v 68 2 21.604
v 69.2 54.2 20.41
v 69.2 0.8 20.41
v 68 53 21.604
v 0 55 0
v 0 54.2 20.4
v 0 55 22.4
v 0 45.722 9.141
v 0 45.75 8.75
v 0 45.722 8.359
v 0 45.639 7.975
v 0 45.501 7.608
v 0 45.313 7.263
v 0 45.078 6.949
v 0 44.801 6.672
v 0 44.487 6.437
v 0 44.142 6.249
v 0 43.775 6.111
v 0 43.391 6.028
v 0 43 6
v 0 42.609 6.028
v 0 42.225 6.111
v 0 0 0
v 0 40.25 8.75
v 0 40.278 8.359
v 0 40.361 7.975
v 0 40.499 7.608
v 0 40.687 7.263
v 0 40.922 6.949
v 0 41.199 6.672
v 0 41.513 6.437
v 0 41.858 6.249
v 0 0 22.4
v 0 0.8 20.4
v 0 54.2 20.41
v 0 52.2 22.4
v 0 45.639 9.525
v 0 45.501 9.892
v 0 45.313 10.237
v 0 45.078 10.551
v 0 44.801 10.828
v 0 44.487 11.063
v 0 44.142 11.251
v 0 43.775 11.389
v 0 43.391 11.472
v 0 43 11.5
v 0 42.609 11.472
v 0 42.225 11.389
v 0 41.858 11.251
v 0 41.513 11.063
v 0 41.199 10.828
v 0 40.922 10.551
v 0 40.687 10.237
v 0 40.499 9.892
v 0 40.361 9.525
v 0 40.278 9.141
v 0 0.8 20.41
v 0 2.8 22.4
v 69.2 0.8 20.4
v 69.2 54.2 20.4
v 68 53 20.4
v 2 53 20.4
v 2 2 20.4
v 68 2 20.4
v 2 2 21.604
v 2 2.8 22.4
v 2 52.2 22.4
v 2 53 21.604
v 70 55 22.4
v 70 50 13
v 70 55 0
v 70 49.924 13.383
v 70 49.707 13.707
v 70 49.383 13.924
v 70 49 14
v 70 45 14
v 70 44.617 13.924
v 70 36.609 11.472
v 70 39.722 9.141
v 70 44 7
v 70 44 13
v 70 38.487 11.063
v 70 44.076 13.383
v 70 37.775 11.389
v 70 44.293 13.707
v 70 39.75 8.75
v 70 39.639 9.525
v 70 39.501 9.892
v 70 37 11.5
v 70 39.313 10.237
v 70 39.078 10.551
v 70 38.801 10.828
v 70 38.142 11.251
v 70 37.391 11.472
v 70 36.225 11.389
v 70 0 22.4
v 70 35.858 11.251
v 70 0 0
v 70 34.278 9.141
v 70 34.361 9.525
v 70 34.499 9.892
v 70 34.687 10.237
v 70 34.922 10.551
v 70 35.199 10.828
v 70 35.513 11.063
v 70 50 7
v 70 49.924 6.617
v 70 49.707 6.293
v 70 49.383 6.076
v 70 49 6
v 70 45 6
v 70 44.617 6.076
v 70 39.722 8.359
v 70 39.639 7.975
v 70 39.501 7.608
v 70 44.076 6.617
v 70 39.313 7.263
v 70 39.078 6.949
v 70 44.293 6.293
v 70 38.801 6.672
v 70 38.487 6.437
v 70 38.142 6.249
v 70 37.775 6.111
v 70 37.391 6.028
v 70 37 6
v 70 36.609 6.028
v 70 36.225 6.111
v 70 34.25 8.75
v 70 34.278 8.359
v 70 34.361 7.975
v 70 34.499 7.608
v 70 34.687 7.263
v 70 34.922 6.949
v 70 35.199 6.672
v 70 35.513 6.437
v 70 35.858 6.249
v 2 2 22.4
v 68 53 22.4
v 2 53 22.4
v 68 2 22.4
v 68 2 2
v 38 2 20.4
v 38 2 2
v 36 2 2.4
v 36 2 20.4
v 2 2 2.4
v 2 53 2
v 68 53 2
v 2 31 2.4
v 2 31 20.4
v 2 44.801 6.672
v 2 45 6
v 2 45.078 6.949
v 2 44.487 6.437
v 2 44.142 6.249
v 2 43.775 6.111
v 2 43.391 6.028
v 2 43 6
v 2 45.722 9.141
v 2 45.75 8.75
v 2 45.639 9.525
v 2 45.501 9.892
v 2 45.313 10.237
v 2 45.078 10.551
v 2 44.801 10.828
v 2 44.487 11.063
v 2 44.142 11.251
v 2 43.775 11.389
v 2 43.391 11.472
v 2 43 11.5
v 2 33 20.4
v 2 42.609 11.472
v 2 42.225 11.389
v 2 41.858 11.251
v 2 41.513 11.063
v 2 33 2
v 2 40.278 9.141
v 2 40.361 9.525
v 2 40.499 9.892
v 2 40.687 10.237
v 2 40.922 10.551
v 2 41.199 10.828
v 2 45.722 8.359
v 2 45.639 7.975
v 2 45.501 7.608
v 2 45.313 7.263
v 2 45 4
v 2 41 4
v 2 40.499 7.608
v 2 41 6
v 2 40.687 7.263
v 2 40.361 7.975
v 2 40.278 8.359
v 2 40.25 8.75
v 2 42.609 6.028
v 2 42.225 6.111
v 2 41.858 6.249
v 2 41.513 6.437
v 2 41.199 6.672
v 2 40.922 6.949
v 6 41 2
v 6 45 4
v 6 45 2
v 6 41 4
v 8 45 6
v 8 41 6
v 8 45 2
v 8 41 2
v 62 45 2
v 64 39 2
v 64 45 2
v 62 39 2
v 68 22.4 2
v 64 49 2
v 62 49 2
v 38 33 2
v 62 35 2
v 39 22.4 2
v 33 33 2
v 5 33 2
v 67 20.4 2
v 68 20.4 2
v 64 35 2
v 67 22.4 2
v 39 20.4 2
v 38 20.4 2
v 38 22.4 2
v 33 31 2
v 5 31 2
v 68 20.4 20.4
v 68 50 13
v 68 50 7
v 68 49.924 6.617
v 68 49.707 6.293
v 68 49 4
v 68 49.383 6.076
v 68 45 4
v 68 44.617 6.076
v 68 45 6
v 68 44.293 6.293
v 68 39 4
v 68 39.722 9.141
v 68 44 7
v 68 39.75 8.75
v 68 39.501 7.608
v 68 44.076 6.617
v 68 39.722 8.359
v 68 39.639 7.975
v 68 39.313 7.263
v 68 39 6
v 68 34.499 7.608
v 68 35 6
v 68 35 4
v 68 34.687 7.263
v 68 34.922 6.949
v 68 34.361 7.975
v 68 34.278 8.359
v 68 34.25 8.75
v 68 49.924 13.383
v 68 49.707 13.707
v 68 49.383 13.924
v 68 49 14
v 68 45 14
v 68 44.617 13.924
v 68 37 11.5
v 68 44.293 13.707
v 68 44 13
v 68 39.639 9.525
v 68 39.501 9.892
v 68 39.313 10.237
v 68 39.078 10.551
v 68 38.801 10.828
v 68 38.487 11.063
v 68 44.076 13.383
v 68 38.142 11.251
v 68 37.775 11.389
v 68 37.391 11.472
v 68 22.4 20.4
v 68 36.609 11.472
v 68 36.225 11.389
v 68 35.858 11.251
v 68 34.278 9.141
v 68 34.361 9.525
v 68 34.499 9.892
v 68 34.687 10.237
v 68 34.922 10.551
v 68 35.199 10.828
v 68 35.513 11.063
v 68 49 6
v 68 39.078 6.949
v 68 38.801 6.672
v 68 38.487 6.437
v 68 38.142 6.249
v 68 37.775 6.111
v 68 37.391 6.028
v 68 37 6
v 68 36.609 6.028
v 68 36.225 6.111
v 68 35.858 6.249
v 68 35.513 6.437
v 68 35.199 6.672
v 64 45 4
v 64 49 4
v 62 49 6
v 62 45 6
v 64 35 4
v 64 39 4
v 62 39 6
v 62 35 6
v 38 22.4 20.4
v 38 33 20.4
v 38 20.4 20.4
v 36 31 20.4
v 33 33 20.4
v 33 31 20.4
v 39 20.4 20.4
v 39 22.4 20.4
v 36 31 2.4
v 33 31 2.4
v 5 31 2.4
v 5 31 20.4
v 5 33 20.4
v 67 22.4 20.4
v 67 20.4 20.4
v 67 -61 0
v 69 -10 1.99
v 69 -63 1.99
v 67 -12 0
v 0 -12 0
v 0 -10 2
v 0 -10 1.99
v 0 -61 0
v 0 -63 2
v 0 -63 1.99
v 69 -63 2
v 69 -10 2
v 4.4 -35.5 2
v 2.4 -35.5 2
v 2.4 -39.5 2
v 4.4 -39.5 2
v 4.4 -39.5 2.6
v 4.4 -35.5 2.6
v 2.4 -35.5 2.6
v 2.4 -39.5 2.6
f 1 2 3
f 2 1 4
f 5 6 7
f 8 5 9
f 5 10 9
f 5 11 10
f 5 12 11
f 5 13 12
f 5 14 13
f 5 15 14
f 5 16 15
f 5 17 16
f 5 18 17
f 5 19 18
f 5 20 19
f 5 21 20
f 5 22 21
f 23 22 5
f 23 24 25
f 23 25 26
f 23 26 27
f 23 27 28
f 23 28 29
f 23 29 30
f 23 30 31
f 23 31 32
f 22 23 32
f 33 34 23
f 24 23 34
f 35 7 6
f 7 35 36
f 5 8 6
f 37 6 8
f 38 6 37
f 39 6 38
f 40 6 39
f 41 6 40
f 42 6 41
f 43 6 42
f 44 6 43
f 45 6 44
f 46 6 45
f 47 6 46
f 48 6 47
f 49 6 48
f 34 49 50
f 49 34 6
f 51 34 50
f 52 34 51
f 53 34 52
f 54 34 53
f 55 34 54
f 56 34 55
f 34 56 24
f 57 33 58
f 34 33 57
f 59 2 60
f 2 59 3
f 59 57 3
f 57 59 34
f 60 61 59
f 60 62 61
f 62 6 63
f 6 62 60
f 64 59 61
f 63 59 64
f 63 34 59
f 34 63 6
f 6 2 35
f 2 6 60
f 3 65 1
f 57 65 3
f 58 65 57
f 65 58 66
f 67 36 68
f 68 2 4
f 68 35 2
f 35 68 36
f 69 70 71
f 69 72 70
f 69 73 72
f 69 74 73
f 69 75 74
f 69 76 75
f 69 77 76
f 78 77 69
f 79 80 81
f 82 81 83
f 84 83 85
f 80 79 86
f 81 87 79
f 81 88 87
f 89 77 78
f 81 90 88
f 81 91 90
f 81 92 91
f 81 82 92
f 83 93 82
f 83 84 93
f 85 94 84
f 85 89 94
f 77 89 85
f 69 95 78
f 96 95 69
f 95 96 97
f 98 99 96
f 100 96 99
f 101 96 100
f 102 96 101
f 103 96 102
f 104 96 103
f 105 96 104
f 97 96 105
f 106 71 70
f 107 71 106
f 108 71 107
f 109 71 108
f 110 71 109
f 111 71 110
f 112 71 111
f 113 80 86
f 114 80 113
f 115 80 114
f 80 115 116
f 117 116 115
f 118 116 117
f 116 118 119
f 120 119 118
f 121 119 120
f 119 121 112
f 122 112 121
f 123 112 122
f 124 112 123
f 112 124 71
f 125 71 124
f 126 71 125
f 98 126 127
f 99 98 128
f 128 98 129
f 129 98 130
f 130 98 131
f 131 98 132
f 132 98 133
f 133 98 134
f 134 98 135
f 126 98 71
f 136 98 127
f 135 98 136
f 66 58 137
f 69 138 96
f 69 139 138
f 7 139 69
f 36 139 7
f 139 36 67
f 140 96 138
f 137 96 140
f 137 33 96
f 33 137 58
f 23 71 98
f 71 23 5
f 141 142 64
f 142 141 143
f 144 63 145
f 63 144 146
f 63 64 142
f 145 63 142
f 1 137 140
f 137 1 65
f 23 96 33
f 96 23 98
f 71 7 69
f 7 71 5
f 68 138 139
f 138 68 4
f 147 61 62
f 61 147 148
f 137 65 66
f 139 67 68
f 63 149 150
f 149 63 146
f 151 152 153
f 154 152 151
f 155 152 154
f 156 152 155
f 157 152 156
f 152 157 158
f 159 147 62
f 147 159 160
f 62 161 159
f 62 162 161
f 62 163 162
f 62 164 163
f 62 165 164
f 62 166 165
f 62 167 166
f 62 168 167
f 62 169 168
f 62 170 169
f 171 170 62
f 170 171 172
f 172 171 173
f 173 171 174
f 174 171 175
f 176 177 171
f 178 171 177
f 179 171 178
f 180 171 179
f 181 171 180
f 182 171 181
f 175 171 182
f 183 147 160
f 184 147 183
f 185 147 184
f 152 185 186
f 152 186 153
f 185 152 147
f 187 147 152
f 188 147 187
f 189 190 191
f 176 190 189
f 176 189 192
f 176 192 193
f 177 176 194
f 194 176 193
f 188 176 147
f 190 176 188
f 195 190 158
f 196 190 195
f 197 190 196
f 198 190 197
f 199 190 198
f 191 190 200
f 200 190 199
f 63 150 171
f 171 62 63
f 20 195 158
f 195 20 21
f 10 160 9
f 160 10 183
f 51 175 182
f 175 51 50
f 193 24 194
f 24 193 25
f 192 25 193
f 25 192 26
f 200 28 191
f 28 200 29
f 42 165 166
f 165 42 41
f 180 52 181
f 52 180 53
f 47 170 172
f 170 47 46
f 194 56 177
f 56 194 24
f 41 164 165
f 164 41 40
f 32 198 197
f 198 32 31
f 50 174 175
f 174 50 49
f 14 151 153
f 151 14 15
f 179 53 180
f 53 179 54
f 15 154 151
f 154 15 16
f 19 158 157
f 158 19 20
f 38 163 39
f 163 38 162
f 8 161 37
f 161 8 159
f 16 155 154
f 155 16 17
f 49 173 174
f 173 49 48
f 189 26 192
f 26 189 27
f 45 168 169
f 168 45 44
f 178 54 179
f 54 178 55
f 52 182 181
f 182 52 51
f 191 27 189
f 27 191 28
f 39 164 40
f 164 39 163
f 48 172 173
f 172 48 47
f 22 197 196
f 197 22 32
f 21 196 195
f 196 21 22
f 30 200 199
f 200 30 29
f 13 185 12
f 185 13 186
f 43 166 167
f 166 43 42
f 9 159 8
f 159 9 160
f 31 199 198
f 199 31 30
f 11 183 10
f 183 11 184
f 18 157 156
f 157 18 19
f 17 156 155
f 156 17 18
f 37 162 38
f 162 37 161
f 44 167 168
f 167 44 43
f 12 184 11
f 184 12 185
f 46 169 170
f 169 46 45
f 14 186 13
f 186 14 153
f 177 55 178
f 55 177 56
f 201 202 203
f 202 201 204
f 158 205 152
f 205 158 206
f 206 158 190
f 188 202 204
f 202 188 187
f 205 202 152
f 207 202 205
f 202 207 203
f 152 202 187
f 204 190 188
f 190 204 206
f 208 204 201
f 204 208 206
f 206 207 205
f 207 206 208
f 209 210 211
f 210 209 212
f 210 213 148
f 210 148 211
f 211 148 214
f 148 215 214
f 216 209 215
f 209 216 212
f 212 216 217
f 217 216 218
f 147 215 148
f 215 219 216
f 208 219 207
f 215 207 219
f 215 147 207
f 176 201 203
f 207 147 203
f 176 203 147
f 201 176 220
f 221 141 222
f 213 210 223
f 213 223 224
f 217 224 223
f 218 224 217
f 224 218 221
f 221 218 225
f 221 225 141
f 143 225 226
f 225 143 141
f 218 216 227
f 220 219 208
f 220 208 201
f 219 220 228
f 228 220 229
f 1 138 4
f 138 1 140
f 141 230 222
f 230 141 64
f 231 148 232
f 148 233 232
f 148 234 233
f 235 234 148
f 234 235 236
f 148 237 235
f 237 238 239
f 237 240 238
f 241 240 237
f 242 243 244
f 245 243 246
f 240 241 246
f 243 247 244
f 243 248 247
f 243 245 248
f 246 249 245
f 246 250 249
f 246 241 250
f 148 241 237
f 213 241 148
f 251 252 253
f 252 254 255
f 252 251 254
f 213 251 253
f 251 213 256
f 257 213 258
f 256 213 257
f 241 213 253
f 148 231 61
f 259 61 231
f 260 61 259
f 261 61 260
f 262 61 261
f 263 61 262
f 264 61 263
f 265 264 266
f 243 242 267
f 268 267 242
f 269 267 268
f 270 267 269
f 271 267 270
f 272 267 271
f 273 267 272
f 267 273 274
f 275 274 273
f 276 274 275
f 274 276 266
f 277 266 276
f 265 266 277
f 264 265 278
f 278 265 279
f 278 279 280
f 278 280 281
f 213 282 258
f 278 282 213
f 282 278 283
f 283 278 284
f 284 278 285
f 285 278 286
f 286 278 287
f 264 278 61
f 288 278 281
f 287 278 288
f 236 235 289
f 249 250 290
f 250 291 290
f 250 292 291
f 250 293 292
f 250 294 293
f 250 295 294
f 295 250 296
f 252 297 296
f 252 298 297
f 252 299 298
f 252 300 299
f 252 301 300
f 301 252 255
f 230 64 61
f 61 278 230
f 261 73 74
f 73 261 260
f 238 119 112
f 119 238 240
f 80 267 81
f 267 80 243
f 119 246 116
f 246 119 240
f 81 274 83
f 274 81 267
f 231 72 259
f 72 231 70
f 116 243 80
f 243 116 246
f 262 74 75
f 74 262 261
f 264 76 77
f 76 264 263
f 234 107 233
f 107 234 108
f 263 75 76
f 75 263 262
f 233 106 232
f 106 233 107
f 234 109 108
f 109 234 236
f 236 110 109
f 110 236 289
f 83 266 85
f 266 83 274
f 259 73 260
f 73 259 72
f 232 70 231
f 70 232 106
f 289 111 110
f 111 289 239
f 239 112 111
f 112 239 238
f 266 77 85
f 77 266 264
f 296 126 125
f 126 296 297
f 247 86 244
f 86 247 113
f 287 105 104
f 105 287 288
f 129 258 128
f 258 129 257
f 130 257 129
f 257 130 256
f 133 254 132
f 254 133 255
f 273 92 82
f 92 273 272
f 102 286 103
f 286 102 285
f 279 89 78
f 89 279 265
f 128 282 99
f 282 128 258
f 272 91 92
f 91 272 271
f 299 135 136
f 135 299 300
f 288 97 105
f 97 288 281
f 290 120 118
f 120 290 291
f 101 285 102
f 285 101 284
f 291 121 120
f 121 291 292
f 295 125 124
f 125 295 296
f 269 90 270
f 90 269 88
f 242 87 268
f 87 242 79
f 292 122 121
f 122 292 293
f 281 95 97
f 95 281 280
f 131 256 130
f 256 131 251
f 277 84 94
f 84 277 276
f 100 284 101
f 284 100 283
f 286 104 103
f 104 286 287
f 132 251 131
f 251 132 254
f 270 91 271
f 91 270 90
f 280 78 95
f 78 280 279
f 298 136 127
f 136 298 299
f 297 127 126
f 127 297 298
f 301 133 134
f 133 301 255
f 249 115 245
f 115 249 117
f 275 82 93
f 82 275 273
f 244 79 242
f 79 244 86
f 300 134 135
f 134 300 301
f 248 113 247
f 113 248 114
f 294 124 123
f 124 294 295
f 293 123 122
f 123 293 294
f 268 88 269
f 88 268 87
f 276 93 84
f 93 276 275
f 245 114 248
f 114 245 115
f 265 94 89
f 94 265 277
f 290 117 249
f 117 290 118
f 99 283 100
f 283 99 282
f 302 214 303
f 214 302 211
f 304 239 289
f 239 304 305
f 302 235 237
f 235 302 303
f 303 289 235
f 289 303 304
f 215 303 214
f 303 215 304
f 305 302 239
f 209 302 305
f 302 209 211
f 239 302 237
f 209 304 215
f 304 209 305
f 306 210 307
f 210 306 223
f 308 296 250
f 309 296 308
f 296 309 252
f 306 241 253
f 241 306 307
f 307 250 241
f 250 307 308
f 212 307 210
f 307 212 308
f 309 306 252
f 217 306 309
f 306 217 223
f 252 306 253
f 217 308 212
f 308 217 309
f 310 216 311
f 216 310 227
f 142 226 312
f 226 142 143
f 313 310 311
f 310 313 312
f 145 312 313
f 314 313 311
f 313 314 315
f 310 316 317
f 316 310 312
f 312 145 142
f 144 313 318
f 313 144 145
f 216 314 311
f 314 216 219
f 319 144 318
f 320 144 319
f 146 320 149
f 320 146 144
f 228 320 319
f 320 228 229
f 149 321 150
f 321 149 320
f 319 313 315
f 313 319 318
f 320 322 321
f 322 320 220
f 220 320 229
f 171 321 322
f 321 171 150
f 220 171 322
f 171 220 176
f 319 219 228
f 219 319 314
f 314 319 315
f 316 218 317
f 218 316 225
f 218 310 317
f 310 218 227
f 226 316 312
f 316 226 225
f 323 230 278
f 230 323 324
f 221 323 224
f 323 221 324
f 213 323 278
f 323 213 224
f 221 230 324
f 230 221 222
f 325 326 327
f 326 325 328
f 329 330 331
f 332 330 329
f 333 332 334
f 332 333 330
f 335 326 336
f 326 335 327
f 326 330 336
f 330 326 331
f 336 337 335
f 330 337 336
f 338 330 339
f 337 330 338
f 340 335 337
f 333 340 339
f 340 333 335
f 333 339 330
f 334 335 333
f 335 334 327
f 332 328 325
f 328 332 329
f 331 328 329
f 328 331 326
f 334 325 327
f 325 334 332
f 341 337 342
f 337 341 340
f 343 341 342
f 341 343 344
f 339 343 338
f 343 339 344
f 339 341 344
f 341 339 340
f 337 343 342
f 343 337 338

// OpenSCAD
thickness = 2;

shellyWidth = 34;
shellyDepth = 29;
shellyHeight = 16 + 2;
shellyGrip = 3;

wagoWidth = 30;
wagoDepth = 18.4;
wagoHeight = 2 * 8.2 + 2; // 2 stacked
wagoGrip = 1;

cableBoxDepth = 20;

cableADiameter = 5.5;
cableBSize = [8, 6];
cableBRounding = 1;
cableBOffset = 4;
cableCDiameter = 5.5;
cableCOffset = 6;

capGap = 1;
capTolerance = 0.2;

moduleDepth = max(shellyDepth, wagoDepth);
moduleHeight = max(shellyHeight, wagoHeight);

cableCenterY = 2 * thickness + moduleDepth + cableBoxDepth / 2;

boxWidth = 3 * thickness + shellyWidth + wagoWidth;
boxDepth = 3 * thickness + moduleDepth + cableBoxDepth;
boxHeight = 2 * thickness + moduleHeight;

cableClipOpeningD = 4;
cableClipOpeningW = 4;
cableClipOpeningH = 2;
cableClipHeight = cableClipOpeningH + thickness;

$fa = $preview ? 1 : 0.4;
$fs = $preview ? 1 : 0.4;

module box() {
    color("red")
    cube([boxWidth, boxDepth, thickness]);
    
    difference() {
        cube([boxWidth, thickness, boxHeight]);
        
        capCutout();
    }
    
    difference() {
        translate([0, boxDepth - thickness, 0])
        cube([boxWidth, thickness, boxHeight]);
        
        capCutout();
    }
    
    difference() {
        cube([thickness, boxDepth, boxHeight]);
        
        translate([-0.01, cableCenterY, thickness + cableClipHeight + cableADiameter / 2])
        rotate([0, 90, 0])
        linear_extrude(thickness + 0.02)   
        circle(d = cableADiameter);
        
        capCutout();
    }
    
    translate([thickness, cableCenterY - cableClipOpeningD / 2, thickness])
    cableClip();
    
    difference() {
        translate([boxWidth - thickness, 0, 0]) {
            difference() {
                cube([thickness, boxDepth, boxHeight]);
                
                translate([-0.01, cableCenterY + cableBOffset, thickness + cableClipHeight + cableBSize.x / 2])
                rotate([0, 90, 0])
                linear_extrude(thickness + 0.02)
                offset(cableBRounding)
                offset(-cableBRounding)
                square([cableBSize.x, cableBSize.y], center = true);
                
                translate([-0.01, cableCenterY - cableCOffset, thickness + cableClipHeight + cableCDiameter / 2])
                rotate([0, 90, 0])
                linear_extrude(thickness + 0.02)   
                circle(d = cableCDiameter);
            }
        }
        
        capCutout();
    }
    
    translate([boxWidth - thickness, cableCenterY + cableBOffset - cableClipOpeningD / 2, thickness])
    scale([-1, 1, 1])
    cableClip();
    
    translate([boxWidth - thickness, cableCenterY - cableCOffset - cableClipOpeningD / 2, thickness])
    scale([-1, 1, 1])
    cableClip();
    
    translate([thickness + shellyWidth, thickness, thickness])
    cube([thickness, moduleDepth + thickness, moduleHeight]);
    
    translate([thickness, thickness, thickness])
    cube([shellyWidth, shellyDepth, moduleHeight - shellyHeight]);
    
    translate([thickness, thickness + shellyDepth, thickness])
    cube([shellyGrip, thickness, moduleHeight]);
    
    translate([thickness + shellyWidth - shellyGrip, thickness + shellyDepth, thickness])
    cube([shellyGrip, thickness, moduleHeight]);
    
    translate([2 * thickness + shellyWidth, thickness + wagoDepth, thickness])
    cube([wagoGrip, thickness, moduleHeight]);
    
    translate([2 * thickness + shellyWidth + wagoWidth - wagoGrip, thickness + wagoDepth, thickness])
    cube([wagoGrip, thickness, moduleHeight]);
}

module cableClip() {
    translate([0, 0, cableClipOpeningH])
    cube([cableClipOpeningW, cableClipOpeningD, thickness]);
    
    translate([cableClipOpeningW, 0, 0])
    cube([thickness, cableClipOpeningD, cableClipOpeningH + thickness]);
}

module cap(t = 0) {
    translate([0, -t, 0])
    hull() {
        cube([boxWidth - capGap + t, boxDepth - 2 * capGap + 2*t, 0.01]);
        
        translate([0, capGap + thickness / 2, thickness - 0.01])
        cube([boxWidth - capGap - thickness + t, boxDepth - 2 * capGap - 2 * thickness + 2 * t, 0.01]);
    }
    
    translate([thickness + 0.4, (boxDepth - 4) / 2, -0.6])
    cube([2, 4, 0.6]);
}

module capCutout() {
    translate([0, capGap, boxHeight - thickness])
    cap(capTolerance);
}

module testAssembly() {
    translate([-5, boxDepth / 2, boxHeight / 2])
    rotate([0, 90, 0])
    linear_extrude(boxWidth + 10)
    difference() {        
        circle(d = 71);
        circle(d = 70);
    }
    
    box();
    
    translate([0, capGap, boxHeight - thickness])
    cap();
}

module printLayout() {
    box();
    
    translate([0, -10, thickness])
    rotate([180, 0, 0])
    cap();
}

printLayout();
